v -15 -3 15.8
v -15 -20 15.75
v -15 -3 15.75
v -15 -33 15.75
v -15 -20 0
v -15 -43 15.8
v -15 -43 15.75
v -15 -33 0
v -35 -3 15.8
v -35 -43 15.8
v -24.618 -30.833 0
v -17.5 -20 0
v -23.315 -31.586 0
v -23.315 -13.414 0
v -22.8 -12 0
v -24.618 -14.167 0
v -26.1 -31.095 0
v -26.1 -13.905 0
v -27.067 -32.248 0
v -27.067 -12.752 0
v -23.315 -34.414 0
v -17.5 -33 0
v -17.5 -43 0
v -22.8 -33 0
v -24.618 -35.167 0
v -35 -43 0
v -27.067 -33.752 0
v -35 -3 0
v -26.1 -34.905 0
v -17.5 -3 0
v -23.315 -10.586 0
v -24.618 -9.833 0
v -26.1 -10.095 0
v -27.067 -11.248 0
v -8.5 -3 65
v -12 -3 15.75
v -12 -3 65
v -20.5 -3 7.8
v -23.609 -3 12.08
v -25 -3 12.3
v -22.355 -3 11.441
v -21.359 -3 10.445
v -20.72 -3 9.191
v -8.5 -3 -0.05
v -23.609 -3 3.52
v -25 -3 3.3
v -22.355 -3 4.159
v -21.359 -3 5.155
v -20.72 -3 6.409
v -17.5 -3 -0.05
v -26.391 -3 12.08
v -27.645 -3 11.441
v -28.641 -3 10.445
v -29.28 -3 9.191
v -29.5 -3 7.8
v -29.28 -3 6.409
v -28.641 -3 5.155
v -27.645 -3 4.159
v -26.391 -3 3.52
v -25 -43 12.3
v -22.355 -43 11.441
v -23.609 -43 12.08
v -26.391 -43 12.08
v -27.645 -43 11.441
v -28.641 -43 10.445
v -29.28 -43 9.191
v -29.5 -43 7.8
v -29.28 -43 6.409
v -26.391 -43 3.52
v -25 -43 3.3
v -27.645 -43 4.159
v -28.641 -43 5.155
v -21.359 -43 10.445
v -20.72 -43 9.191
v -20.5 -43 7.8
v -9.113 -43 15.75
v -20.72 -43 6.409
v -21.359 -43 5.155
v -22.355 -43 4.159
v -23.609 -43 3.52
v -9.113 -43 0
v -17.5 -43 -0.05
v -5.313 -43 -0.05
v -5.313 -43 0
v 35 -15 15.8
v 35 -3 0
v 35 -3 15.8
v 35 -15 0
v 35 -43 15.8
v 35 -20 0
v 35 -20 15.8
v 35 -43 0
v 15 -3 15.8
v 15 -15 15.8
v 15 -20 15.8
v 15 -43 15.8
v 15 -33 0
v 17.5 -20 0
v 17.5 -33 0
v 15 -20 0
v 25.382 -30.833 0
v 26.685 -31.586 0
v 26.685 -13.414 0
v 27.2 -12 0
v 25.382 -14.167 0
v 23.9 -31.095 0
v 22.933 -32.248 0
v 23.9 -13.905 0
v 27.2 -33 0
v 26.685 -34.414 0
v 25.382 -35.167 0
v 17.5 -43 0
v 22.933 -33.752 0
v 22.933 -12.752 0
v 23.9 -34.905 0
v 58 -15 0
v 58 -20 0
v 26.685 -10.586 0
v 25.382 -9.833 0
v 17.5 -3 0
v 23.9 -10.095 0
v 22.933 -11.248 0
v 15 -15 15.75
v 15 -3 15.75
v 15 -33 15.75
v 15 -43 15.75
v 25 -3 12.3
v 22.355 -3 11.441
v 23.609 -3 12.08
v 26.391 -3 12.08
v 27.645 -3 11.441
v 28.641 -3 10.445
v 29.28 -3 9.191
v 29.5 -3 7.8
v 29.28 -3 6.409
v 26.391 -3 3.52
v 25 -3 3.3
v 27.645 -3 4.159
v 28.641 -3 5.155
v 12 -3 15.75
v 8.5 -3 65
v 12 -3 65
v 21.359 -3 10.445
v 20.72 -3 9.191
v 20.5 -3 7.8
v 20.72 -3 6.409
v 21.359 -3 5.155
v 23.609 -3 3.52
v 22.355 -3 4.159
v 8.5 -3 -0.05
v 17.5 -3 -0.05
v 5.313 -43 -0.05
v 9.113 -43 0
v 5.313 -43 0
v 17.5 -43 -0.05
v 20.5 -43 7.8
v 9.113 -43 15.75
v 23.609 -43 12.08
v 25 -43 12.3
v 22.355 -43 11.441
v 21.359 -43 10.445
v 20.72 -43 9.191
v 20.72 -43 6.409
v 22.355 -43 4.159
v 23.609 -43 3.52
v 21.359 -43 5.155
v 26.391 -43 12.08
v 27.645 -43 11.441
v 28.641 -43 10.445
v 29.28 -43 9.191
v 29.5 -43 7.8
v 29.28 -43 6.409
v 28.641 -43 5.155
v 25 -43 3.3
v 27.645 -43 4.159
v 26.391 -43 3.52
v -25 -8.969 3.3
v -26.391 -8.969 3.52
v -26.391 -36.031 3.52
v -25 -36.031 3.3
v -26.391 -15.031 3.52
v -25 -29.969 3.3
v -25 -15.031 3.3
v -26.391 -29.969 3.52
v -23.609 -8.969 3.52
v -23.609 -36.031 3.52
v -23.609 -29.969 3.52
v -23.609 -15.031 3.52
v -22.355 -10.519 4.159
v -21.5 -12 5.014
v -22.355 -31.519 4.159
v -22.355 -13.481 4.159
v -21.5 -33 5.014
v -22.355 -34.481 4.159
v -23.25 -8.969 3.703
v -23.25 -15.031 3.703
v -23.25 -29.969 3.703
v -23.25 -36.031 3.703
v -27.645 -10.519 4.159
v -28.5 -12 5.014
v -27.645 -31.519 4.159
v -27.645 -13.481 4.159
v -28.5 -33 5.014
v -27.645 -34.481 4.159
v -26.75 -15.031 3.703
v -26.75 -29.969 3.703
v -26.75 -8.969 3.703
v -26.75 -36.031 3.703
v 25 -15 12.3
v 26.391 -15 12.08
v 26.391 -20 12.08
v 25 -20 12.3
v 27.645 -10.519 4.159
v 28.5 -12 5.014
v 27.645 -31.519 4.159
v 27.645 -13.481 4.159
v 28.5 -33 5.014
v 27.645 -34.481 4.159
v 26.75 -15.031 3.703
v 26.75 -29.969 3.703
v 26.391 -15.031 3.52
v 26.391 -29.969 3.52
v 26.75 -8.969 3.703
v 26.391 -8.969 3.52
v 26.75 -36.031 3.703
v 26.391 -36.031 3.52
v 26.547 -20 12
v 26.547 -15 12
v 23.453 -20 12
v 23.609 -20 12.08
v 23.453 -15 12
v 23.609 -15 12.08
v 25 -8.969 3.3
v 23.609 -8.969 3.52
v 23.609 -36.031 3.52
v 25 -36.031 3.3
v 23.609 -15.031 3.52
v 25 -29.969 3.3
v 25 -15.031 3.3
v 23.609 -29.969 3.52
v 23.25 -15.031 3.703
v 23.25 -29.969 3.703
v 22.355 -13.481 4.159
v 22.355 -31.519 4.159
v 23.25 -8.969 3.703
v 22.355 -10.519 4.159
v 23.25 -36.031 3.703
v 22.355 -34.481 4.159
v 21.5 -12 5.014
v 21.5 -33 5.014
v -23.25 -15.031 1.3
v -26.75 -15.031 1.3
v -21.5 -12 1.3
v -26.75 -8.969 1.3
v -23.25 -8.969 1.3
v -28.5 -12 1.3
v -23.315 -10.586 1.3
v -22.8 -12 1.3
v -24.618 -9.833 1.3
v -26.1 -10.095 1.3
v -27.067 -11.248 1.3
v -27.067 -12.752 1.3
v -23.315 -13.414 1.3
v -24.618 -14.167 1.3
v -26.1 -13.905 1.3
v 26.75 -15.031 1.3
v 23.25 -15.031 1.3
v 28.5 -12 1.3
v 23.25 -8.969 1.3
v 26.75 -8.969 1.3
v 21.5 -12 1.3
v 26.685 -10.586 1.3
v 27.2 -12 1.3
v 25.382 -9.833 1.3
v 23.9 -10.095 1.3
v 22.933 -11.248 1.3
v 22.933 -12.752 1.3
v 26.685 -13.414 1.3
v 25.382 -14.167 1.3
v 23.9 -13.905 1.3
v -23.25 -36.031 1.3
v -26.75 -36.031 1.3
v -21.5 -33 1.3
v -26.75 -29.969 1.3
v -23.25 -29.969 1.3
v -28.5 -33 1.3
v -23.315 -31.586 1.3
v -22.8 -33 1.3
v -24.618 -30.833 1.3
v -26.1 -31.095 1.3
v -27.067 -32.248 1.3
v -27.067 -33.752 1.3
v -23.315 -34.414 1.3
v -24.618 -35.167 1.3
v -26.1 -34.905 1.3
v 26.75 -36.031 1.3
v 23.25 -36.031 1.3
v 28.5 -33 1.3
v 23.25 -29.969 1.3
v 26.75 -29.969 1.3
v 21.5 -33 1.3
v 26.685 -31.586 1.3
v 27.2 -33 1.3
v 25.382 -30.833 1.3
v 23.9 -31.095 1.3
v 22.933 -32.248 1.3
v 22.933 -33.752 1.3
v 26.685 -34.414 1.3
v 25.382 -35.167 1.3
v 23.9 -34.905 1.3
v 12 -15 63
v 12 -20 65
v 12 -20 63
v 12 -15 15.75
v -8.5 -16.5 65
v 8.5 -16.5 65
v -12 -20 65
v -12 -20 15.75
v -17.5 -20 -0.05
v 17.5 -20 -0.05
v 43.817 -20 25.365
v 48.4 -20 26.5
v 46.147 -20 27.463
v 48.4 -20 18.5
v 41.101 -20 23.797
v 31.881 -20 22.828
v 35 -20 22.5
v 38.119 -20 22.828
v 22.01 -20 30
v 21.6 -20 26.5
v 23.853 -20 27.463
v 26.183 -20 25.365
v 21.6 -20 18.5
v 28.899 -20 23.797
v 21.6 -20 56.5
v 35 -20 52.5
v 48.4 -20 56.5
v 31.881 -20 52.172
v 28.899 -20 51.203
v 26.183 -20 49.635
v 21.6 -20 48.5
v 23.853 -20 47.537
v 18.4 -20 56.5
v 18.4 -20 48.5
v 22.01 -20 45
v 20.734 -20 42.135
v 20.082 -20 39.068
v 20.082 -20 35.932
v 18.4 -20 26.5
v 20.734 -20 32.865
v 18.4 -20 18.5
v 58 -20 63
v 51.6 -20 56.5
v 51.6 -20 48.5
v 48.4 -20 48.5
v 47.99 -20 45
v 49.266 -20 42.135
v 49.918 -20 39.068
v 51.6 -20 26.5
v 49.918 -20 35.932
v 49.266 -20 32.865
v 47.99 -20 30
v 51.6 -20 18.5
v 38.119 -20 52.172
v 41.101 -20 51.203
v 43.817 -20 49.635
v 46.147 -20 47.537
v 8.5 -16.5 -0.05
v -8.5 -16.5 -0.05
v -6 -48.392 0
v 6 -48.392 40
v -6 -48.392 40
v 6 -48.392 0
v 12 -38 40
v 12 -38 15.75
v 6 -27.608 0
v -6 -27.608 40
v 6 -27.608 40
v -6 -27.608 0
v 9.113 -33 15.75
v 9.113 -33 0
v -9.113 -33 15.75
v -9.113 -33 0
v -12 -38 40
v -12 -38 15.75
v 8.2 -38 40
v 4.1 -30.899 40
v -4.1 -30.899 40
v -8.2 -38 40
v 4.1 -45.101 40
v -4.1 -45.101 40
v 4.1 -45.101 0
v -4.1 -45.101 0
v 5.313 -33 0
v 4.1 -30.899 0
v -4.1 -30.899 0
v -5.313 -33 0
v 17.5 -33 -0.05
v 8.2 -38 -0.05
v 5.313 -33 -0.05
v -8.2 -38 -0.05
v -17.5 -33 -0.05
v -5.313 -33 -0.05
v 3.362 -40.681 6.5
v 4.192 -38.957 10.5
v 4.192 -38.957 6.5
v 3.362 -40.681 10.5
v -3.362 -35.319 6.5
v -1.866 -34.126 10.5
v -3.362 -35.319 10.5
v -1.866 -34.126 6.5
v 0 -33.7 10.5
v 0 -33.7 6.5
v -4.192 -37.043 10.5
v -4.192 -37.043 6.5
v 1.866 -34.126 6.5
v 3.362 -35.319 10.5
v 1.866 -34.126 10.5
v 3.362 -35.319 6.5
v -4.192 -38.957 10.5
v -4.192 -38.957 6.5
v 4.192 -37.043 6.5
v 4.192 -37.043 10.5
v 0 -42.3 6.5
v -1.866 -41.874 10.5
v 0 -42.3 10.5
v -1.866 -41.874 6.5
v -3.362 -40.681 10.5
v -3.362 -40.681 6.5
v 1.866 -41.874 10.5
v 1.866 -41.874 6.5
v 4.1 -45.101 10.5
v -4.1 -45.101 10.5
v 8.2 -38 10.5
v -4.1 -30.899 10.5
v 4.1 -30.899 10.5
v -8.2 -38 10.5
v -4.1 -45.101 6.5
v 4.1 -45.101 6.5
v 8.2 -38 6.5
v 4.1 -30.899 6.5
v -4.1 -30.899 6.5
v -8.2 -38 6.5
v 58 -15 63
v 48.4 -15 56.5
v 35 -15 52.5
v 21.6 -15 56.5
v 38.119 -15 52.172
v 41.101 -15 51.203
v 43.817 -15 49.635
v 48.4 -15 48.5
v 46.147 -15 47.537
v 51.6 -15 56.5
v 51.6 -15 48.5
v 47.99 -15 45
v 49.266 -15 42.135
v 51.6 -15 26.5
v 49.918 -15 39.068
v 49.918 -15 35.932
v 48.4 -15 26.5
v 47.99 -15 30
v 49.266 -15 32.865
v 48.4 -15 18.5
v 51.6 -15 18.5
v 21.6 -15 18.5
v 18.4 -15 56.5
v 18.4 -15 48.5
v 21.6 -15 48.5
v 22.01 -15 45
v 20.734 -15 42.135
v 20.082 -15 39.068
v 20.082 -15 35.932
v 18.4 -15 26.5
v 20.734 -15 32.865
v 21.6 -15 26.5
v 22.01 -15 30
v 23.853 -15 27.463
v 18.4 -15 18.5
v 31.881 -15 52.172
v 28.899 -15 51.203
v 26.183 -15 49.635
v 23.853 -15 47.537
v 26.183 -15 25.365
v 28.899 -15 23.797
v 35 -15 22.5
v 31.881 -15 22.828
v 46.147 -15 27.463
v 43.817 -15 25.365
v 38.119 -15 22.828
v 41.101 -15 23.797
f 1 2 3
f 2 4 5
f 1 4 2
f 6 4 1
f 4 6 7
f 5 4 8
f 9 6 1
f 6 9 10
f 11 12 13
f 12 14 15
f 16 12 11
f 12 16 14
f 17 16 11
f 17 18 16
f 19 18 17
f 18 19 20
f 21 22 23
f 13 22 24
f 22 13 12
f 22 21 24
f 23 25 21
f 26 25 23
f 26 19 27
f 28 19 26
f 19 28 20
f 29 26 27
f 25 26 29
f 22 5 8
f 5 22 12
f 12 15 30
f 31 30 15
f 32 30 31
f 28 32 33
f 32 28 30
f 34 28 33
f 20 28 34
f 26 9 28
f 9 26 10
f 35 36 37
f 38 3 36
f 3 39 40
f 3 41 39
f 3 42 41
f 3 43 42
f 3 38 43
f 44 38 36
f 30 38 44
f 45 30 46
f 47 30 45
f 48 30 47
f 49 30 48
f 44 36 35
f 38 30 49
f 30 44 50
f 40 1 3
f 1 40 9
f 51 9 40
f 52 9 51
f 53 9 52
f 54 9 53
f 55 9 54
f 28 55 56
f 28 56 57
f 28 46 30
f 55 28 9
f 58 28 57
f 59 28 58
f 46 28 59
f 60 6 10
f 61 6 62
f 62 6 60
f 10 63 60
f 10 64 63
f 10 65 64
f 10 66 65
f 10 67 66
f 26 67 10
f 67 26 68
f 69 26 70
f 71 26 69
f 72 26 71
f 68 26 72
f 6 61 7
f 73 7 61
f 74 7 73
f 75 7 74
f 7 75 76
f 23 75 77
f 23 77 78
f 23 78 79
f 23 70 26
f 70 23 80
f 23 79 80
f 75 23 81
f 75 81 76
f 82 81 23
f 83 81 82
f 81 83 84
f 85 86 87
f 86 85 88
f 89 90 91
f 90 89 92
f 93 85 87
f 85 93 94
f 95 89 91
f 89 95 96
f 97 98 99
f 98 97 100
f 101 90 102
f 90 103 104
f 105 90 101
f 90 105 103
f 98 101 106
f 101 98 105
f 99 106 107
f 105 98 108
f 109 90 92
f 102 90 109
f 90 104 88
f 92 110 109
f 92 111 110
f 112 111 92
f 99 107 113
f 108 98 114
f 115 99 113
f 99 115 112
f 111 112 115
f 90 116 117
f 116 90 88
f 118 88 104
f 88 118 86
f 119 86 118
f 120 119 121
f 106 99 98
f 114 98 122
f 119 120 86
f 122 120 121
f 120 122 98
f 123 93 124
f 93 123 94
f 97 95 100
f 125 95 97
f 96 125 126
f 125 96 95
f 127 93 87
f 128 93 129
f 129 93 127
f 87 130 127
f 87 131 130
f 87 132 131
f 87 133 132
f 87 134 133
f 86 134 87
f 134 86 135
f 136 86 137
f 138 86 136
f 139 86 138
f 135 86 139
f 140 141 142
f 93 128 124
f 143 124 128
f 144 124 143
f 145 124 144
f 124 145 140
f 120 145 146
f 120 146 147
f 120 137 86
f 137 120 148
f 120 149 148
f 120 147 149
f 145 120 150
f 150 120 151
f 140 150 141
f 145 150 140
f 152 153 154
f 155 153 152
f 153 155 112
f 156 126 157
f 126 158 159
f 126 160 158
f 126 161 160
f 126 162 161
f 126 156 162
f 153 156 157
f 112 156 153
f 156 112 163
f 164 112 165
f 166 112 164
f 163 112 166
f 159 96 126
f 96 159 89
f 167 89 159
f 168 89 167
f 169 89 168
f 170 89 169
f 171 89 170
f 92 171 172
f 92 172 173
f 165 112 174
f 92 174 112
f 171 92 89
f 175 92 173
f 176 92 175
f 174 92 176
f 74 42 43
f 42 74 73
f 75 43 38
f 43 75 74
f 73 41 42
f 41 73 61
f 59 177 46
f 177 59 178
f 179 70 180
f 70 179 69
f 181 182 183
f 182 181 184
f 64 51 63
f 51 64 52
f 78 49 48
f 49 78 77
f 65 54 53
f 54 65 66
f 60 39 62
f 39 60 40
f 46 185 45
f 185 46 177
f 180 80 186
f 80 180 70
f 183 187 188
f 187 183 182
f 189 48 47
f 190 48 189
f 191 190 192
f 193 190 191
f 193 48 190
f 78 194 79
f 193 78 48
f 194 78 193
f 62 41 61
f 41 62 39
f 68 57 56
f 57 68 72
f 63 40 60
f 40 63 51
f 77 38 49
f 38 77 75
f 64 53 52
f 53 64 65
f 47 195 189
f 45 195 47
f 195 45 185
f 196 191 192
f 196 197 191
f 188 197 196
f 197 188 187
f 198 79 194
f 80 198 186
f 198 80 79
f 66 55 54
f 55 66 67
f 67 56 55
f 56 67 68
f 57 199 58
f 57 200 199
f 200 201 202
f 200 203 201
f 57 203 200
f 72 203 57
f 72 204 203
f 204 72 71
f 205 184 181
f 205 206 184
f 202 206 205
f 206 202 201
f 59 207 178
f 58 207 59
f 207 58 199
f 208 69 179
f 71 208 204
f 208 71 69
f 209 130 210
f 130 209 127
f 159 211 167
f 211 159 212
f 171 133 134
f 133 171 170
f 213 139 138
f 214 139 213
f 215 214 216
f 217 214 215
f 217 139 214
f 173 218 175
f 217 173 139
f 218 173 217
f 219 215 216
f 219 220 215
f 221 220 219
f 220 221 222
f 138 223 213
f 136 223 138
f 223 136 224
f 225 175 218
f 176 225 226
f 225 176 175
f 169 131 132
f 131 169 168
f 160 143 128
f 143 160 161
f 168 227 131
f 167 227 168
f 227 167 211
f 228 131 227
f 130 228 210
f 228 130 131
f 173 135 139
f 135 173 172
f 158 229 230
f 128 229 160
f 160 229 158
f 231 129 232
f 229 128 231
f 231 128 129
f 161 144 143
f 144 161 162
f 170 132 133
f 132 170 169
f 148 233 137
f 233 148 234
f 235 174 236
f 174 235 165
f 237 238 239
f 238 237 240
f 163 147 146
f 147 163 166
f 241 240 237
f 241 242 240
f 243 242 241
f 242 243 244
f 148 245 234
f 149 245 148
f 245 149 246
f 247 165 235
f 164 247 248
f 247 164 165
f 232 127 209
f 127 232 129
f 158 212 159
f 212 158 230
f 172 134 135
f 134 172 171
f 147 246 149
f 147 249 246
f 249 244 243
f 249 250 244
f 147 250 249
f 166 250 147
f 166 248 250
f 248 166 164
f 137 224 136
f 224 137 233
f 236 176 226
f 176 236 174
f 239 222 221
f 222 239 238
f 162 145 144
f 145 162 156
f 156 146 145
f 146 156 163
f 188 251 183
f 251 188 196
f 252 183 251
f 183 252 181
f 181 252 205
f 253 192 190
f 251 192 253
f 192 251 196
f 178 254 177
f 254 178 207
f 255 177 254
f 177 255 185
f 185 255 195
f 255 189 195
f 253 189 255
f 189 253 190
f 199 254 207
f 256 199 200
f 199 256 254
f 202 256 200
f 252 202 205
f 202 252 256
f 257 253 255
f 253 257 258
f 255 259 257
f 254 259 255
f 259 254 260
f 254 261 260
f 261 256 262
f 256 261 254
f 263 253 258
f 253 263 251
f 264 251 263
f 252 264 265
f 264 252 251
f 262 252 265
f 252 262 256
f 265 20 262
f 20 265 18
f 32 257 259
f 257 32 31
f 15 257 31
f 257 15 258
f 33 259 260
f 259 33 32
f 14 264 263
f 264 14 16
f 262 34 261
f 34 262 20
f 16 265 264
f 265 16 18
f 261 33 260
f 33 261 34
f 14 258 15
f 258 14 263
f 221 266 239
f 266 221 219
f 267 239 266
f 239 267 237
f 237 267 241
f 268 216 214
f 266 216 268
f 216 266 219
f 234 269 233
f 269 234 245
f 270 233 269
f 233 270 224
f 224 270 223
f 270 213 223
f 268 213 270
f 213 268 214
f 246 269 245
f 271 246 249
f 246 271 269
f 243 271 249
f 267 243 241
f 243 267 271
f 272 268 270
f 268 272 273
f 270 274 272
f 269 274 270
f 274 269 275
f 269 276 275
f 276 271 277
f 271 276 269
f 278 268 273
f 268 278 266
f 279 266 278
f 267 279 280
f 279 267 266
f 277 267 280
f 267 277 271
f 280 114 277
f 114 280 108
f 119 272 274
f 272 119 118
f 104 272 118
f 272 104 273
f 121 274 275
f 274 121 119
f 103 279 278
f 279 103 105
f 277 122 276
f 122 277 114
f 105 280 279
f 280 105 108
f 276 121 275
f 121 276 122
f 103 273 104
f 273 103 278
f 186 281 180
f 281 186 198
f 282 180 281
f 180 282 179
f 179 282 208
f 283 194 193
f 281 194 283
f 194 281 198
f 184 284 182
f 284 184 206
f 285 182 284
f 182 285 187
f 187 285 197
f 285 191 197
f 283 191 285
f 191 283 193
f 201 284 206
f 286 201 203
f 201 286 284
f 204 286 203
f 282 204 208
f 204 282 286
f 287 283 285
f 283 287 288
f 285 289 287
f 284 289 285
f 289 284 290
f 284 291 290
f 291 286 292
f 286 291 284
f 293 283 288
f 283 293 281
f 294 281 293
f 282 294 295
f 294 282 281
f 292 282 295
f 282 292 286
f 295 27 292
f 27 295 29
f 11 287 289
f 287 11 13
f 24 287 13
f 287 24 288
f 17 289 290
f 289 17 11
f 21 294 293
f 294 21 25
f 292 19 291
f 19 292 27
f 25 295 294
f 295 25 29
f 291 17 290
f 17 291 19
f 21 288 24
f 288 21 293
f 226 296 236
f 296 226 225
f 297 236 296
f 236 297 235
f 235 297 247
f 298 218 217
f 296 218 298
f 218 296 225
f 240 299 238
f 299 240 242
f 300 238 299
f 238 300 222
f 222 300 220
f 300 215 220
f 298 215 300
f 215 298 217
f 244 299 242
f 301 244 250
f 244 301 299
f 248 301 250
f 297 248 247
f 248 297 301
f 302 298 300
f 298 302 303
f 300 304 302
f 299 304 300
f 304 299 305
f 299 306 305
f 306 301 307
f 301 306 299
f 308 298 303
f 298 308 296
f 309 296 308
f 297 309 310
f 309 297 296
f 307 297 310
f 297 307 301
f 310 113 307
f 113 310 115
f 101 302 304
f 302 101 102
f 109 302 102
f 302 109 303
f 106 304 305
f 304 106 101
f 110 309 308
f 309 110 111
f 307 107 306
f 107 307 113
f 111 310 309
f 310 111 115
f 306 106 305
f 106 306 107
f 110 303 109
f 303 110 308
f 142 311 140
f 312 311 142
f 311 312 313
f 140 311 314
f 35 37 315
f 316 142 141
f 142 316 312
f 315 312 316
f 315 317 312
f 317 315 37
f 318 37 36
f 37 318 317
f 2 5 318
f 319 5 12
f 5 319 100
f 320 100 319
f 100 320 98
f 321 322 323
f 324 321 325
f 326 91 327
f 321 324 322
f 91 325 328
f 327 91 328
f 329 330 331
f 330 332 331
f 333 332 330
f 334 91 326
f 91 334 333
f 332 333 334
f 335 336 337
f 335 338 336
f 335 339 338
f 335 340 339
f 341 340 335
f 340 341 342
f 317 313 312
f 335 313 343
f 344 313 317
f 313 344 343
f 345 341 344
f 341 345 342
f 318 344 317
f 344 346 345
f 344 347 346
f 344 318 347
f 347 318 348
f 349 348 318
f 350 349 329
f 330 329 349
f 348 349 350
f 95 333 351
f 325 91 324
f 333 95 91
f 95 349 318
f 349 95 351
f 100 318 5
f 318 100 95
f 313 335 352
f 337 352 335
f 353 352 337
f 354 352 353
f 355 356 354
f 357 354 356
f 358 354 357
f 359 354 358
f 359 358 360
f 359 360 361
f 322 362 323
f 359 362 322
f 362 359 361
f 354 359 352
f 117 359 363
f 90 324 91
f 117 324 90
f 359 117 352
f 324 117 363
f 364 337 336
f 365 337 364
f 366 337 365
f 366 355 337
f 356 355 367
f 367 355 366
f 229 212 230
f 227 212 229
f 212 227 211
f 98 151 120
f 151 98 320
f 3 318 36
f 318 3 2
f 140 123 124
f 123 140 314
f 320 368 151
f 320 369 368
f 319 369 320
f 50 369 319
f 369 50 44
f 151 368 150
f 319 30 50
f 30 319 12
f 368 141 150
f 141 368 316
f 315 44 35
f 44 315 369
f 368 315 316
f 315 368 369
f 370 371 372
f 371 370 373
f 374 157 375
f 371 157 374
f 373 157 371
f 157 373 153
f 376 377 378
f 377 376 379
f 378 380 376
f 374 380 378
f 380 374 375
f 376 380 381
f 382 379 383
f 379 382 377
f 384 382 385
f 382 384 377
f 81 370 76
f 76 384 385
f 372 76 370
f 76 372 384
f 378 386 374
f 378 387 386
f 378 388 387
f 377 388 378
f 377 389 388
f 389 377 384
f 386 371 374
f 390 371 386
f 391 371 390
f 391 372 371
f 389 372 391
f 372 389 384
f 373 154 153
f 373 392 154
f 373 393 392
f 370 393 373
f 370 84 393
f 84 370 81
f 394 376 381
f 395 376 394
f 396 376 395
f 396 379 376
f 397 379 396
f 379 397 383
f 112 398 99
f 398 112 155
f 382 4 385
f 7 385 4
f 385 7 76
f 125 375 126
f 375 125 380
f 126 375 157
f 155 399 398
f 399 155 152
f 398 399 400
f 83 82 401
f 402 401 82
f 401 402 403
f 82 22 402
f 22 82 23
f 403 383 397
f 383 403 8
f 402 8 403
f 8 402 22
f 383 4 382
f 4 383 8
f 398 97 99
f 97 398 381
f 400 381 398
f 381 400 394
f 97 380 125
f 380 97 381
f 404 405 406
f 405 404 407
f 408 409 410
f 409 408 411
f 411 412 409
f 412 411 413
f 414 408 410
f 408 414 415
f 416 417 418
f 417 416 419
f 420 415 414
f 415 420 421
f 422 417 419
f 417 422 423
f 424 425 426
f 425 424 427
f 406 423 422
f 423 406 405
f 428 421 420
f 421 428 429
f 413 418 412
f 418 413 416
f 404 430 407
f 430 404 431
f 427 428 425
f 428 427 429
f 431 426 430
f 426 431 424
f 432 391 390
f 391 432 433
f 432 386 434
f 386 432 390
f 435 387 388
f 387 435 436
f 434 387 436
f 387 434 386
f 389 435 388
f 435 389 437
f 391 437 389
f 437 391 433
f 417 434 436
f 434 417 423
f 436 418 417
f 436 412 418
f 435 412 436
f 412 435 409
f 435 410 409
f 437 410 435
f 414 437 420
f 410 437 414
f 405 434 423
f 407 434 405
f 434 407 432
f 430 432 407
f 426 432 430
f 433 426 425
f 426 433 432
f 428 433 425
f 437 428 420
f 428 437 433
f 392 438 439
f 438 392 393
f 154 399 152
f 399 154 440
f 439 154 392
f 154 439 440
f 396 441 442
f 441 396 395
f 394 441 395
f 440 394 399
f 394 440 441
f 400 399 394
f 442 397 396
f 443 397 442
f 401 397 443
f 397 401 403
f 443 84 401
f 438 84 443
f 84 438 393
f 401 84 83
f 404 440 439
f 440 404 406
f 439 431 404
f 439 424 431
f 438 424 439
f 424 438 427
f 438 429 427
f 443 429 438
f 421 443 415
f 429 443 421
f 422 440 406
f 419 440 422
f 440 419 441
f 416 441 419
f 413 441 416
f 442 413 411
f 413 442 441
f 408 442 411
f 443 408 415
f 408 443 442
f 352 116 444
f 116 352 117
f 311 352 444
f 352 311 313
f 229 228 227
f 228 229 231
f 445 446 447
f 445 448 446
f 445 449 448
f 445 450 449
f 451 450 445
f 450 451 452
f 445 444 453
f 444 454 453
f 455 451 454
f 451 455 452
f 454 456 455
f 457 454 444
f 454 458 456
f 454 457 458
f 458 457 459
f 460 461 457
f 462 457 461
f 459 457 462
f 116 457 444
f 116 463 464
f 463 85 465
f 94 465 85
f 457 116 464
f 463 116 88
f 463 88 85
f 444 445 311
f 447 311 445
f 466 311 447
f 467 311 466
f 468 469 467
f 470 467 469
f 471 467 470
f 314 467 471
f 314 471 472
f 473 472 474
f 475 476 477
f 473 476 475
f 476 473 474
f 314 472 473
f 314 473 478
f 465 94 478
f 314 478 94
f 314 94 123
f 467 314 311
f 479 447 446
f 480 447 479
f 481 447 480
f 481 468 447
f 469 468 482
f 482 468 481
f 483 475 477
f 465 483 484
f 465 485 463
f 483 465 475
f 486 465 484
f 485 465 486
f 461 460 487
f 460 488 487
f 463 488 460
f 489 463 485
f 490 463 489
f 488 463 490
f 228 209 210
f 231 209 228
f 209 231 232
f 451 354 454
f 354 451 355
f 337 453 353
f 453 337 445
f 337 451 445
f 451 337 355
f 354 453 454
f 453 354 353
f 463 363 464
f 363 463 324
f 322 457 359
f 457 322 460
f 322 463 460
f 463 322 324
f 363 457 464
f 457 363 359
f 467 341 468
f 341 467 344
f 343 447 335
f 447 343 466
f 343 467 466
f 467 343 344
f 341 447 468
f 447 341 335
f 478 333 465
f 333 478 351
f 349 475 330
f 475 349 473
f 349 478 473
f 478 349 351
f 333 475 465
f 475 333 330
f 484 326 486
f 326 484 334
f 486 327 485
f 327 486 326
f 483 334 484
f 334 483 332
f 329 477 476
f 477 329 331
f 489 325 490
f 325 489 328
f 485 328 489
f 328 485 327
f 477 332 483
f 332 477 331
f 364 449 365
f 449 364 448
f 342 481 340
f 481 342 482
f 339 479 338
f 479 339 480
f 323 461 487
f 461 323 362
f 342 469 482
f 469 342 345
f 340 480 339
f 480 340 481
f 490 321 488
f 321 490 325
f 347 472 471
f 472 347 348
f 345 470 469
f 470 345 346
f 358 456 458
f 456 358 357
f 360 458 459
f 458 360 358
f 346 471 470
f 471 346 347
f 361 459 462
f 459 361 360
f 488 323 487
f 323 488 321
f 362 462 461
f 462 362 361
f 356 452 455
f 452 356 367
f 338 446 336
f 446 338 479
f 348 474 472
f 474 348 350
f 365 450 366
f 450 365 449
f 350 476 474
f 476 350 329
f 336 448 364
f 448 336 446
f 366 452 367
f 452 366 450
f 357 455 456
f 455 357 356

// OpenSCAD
// file: common.scad
// This file contains common components shared between parts.
// Not only does abstracting like this simplify the parts,
// But it ensures the inter-part rods line up.
// (C) Christopher Olah, 2010. Released under the GPL.
// Many of the components based off of the original designs.

module motor() {
	//This is (essentially) what ever was being used in z-motor-mount orriginaly. 
	// Should be rewriten for NEMA compliance, to match the NEMA_version var.
	// Motor sits in this
	cube(size = [45,43,10], center = true);
	// And goes through this
	translate([0,0,-15]) cylinder(h = 20, r=15);
	//And the screws go through here
	for (y=[-1,1]) for (x=[-1,1]) translate([15*x,15*y,-5]) cube(size = [8,3.2,15], center = true);
}


module diagonal_rod(grip = true) {
	if (grip) for (y=[-1,1]) translate([0,39*y,-40]) rotate([30*y,0,0]) cylinder (h=100,r=4.0);
	if (!grip) for (y=[-1,1]) translate([0,39*y,-40]) rotate([30*y,0,0]) cylinder (h=100,r=4.2);
}

module diagonal_rod_cube (slide = 0, size = [16,16,10]) {
	for (y=[-1,1]) translate([0,39*y,-40]) rotate([30*y,0,0]) translate([0,0,50+slide]) cube(size=size,center=true);
}

module vertical_rods() {
	translate([30,0,-25]) cylinder(h = 80, r=4.0);
	translate([0,0,-25]) cylinder(h = 80, r=4.3);
}


module x_axis_rods() {
	translate([-25, 0, 0]) rotate([90,0,0]) {
		cylinder(h = 120, r=4.5, $fn=20, center=true);
		if (tear_shape) translate([0, 2.60, 0]) cylinder(h = 120, r=3.65, $fn=6, center=true);
	}
	translate([25, 0, 0]) rotate([90,0,0]) {
		cylinder(h = 120, r=4.5, $fn=20, center=true);
		if (tear_shape) translate([0, 2.60, 0]) cylinder(h = 120, r=3.65, $fn=6, center=true);
	}
	if (!x_belt) translate([35, 0, 30]) rotate([90,0,0]) {
		cylinder(h = 120, r=4.5, $fn=20, center=true);
		if (tear_shape) translate([0, 2.60, 0]) cylinder(h = 120, r=3.65, $fn=6, center=true);
	}
}
// file: configuration.scad
// PRUSA Mendel  
// Configuration file
// GNU GPL v2
// Josef Průša
// josefprusa@me.com
// prusadjs.cz
// http://www.reprap.org/wiki/Prusa_Mendel
// http://github.com/prusajr/PrusaMendel

//include <lib/mcad/motors.scad>

// M8 rod diameter
m8_diameter = 8.4;

// M8 nut diameter diameter
// Used for $fn nut trick -> cylinder(h = 5, r=4.5, $fn=6, center=true);
m8_nut_diameter = 16.4;

// M4 rod/screw diameter
m4_diameter = 5;

// M4 nut diameter diameter
// Used for $fn nut trick -> cylinder(h = 5, r=4.5, $fn=6, center=true);
m4_nut_diameter = 9;

// M3 rod/screw diameter
m3_diameter = 4.4;

// M3 nut diameter diameter
// Used for $fn nut trick -> cylinder(h = 5, r=4.5, $fn=6, center=true);
m3_nut_diameter = 7;

// Bushing holders diameter
bushing_diameter = 11;

x_belt = false; //use belt or threaded rod for x-axis movement
               //threaded rod is currently broken. Do not use it.
               //Leave this true or be prepared to do lots of drilling!
               //Also, x-carriage doesn't support this option so you'll
               //have come up with a hack to make it work if you use this
               //option.

two_top_rods = false; //Use two top rods or one?
                      //No repraps have been built with one top, so use
                      //this design at your own risk!


tear_shape = false; //Use tear shaped holes for rods? not compatable with tight_grip = true

tight_grip = true; // Use tight holes where possible so that parts will self tap when 
                   // threaded rod is drilled in. Reduces need for nuts.
                   // tight_grip = false not compatable with two_top_rods = false

//NEMA_version //Variable not yet implemented.
// main file
// PRUSA Mendel  
// X-end with NEMA 17 motor mount
// GNU GPL v2
// Josef Průša
// josefprusa@me.com
// prusadjs.cz
// http://www.reprap.org/wiki/Prusa_Mendel
// http://github.com/prusajr/PrusaMendel

include <configuration.scad>
include <common.scad>


translate(v = [0,17,24.5]) {
	union() {
		difference(){
			union(){
				translate(v = [-25, -40, -16.6])
					cube(size = [20,40,15.8], center = true);
				translate(v = [25, -40, -16.6])
					cube(size = [20,40,15.8], center = true);
			}

			//nut traps
			translate(v = [-25, -29, -19.7]) cylinder(h = 7, r=m3_nut_diameter/2, $fn=6, center=true);
			translate(v = [-25, -29, -20]) cylinder(h = 10, r=m3_diameter/2, $fn=9, center=true);
			translate(v = [25, -29, -19.7]) cylinder(h = 7, r=m3_nut_diameter/2, $fn=6, center=true);
			translate(v = [25, -29, -20]) cylinder(h = 10, r=m3_diameter/2, $fn=9, center=true);

			translate(v = [-25, -50, -19.7]) cylinder(h = 7, r=m3_nut_diameter/2, $fn=6, center=true);
			translate(v = [-25, -50, -20]) cylinder(h = 10, r=m3_diameter/2, $fn=9, center=true);
			translate(v = [25, -50, -19.7]) cylinder(h = 7, r=m3_nut_diameter/2, $fn=6, center=true);
			translate(v = [25, -50, -20]) cylinder(h = 10, r=m3_diameter/2, $fn=9, center=true);

			//holes for axis
			translate(v = [0, -79, -16.7])  x_axis_rods();
		}

		//slider
		translate(v = [0, -25, 15]) {
			difference(){
				union(){
					translate(v = [0, -3.5, -7])cube(size = [24,17,65], center = true);
					translate(v = [0, -3.5, -31.65]) cube(size = [35,17,15.8], center = true);
				}
				translate(v = [0, -0, -7])cube(size = [17,17,70], center = true);
			}
		}

		//nut trap
		translate(v = [0, -55, 15]) {
			difference() {
				union() {
					translate(v = [0, -0, -19.5])
						cylinder(h = 40, r=12, $fn=6, center=true);
					translate(v = [0, 0, -31.65])
						cube(size = [35,10,15.8], center = true);
				}
				translate(v = [0, 0, 16-20])
					cylinder(h = 50, r=m8_nut_diameter/2, $fn=6, center=true);
				translate(v = [0, 0, -43])
					cylinder(h = 20, r=m8_nut_diameter/2, $fn=6, center=true);
				translate(v = [0, 0, -20])
					rotate([0,0,90]) vertical_rods();
			}
		}

		//nema17 connector
		if (x_belt){// use belt or threaded rod?
			translate(v = [0, 0, -12]) {
				difference(){
					union(){
						translate(v = [21, -22.5, 36.5]) cube(size = [24,5,6], center = true);
						translate(v = [32.5, 2, 13.5]) cube(size = [5,54,52], center = true);
						translate(v = [22.5, 2, -11]) cube(size = [20,54,3], center = true);
					}
					translate([25, 7, 20]) rotate([0,-90,0]) rotate([0,0,90]) motor();
				}
			}
		}else {
			translate(v = [0, 0, -12]) {
				difference(){
					union(){
						translate(v = [35, -34.5, 25]) cube(size = [46,5,51], center = true);
						translate(v = [46, -34.5, -6.5]) cube(size = [24,5,12], center = true);
					}	
					translate([35,-25,25]) rotate([-90,90,0]) motor();
				}
			}
		}
	}
}
